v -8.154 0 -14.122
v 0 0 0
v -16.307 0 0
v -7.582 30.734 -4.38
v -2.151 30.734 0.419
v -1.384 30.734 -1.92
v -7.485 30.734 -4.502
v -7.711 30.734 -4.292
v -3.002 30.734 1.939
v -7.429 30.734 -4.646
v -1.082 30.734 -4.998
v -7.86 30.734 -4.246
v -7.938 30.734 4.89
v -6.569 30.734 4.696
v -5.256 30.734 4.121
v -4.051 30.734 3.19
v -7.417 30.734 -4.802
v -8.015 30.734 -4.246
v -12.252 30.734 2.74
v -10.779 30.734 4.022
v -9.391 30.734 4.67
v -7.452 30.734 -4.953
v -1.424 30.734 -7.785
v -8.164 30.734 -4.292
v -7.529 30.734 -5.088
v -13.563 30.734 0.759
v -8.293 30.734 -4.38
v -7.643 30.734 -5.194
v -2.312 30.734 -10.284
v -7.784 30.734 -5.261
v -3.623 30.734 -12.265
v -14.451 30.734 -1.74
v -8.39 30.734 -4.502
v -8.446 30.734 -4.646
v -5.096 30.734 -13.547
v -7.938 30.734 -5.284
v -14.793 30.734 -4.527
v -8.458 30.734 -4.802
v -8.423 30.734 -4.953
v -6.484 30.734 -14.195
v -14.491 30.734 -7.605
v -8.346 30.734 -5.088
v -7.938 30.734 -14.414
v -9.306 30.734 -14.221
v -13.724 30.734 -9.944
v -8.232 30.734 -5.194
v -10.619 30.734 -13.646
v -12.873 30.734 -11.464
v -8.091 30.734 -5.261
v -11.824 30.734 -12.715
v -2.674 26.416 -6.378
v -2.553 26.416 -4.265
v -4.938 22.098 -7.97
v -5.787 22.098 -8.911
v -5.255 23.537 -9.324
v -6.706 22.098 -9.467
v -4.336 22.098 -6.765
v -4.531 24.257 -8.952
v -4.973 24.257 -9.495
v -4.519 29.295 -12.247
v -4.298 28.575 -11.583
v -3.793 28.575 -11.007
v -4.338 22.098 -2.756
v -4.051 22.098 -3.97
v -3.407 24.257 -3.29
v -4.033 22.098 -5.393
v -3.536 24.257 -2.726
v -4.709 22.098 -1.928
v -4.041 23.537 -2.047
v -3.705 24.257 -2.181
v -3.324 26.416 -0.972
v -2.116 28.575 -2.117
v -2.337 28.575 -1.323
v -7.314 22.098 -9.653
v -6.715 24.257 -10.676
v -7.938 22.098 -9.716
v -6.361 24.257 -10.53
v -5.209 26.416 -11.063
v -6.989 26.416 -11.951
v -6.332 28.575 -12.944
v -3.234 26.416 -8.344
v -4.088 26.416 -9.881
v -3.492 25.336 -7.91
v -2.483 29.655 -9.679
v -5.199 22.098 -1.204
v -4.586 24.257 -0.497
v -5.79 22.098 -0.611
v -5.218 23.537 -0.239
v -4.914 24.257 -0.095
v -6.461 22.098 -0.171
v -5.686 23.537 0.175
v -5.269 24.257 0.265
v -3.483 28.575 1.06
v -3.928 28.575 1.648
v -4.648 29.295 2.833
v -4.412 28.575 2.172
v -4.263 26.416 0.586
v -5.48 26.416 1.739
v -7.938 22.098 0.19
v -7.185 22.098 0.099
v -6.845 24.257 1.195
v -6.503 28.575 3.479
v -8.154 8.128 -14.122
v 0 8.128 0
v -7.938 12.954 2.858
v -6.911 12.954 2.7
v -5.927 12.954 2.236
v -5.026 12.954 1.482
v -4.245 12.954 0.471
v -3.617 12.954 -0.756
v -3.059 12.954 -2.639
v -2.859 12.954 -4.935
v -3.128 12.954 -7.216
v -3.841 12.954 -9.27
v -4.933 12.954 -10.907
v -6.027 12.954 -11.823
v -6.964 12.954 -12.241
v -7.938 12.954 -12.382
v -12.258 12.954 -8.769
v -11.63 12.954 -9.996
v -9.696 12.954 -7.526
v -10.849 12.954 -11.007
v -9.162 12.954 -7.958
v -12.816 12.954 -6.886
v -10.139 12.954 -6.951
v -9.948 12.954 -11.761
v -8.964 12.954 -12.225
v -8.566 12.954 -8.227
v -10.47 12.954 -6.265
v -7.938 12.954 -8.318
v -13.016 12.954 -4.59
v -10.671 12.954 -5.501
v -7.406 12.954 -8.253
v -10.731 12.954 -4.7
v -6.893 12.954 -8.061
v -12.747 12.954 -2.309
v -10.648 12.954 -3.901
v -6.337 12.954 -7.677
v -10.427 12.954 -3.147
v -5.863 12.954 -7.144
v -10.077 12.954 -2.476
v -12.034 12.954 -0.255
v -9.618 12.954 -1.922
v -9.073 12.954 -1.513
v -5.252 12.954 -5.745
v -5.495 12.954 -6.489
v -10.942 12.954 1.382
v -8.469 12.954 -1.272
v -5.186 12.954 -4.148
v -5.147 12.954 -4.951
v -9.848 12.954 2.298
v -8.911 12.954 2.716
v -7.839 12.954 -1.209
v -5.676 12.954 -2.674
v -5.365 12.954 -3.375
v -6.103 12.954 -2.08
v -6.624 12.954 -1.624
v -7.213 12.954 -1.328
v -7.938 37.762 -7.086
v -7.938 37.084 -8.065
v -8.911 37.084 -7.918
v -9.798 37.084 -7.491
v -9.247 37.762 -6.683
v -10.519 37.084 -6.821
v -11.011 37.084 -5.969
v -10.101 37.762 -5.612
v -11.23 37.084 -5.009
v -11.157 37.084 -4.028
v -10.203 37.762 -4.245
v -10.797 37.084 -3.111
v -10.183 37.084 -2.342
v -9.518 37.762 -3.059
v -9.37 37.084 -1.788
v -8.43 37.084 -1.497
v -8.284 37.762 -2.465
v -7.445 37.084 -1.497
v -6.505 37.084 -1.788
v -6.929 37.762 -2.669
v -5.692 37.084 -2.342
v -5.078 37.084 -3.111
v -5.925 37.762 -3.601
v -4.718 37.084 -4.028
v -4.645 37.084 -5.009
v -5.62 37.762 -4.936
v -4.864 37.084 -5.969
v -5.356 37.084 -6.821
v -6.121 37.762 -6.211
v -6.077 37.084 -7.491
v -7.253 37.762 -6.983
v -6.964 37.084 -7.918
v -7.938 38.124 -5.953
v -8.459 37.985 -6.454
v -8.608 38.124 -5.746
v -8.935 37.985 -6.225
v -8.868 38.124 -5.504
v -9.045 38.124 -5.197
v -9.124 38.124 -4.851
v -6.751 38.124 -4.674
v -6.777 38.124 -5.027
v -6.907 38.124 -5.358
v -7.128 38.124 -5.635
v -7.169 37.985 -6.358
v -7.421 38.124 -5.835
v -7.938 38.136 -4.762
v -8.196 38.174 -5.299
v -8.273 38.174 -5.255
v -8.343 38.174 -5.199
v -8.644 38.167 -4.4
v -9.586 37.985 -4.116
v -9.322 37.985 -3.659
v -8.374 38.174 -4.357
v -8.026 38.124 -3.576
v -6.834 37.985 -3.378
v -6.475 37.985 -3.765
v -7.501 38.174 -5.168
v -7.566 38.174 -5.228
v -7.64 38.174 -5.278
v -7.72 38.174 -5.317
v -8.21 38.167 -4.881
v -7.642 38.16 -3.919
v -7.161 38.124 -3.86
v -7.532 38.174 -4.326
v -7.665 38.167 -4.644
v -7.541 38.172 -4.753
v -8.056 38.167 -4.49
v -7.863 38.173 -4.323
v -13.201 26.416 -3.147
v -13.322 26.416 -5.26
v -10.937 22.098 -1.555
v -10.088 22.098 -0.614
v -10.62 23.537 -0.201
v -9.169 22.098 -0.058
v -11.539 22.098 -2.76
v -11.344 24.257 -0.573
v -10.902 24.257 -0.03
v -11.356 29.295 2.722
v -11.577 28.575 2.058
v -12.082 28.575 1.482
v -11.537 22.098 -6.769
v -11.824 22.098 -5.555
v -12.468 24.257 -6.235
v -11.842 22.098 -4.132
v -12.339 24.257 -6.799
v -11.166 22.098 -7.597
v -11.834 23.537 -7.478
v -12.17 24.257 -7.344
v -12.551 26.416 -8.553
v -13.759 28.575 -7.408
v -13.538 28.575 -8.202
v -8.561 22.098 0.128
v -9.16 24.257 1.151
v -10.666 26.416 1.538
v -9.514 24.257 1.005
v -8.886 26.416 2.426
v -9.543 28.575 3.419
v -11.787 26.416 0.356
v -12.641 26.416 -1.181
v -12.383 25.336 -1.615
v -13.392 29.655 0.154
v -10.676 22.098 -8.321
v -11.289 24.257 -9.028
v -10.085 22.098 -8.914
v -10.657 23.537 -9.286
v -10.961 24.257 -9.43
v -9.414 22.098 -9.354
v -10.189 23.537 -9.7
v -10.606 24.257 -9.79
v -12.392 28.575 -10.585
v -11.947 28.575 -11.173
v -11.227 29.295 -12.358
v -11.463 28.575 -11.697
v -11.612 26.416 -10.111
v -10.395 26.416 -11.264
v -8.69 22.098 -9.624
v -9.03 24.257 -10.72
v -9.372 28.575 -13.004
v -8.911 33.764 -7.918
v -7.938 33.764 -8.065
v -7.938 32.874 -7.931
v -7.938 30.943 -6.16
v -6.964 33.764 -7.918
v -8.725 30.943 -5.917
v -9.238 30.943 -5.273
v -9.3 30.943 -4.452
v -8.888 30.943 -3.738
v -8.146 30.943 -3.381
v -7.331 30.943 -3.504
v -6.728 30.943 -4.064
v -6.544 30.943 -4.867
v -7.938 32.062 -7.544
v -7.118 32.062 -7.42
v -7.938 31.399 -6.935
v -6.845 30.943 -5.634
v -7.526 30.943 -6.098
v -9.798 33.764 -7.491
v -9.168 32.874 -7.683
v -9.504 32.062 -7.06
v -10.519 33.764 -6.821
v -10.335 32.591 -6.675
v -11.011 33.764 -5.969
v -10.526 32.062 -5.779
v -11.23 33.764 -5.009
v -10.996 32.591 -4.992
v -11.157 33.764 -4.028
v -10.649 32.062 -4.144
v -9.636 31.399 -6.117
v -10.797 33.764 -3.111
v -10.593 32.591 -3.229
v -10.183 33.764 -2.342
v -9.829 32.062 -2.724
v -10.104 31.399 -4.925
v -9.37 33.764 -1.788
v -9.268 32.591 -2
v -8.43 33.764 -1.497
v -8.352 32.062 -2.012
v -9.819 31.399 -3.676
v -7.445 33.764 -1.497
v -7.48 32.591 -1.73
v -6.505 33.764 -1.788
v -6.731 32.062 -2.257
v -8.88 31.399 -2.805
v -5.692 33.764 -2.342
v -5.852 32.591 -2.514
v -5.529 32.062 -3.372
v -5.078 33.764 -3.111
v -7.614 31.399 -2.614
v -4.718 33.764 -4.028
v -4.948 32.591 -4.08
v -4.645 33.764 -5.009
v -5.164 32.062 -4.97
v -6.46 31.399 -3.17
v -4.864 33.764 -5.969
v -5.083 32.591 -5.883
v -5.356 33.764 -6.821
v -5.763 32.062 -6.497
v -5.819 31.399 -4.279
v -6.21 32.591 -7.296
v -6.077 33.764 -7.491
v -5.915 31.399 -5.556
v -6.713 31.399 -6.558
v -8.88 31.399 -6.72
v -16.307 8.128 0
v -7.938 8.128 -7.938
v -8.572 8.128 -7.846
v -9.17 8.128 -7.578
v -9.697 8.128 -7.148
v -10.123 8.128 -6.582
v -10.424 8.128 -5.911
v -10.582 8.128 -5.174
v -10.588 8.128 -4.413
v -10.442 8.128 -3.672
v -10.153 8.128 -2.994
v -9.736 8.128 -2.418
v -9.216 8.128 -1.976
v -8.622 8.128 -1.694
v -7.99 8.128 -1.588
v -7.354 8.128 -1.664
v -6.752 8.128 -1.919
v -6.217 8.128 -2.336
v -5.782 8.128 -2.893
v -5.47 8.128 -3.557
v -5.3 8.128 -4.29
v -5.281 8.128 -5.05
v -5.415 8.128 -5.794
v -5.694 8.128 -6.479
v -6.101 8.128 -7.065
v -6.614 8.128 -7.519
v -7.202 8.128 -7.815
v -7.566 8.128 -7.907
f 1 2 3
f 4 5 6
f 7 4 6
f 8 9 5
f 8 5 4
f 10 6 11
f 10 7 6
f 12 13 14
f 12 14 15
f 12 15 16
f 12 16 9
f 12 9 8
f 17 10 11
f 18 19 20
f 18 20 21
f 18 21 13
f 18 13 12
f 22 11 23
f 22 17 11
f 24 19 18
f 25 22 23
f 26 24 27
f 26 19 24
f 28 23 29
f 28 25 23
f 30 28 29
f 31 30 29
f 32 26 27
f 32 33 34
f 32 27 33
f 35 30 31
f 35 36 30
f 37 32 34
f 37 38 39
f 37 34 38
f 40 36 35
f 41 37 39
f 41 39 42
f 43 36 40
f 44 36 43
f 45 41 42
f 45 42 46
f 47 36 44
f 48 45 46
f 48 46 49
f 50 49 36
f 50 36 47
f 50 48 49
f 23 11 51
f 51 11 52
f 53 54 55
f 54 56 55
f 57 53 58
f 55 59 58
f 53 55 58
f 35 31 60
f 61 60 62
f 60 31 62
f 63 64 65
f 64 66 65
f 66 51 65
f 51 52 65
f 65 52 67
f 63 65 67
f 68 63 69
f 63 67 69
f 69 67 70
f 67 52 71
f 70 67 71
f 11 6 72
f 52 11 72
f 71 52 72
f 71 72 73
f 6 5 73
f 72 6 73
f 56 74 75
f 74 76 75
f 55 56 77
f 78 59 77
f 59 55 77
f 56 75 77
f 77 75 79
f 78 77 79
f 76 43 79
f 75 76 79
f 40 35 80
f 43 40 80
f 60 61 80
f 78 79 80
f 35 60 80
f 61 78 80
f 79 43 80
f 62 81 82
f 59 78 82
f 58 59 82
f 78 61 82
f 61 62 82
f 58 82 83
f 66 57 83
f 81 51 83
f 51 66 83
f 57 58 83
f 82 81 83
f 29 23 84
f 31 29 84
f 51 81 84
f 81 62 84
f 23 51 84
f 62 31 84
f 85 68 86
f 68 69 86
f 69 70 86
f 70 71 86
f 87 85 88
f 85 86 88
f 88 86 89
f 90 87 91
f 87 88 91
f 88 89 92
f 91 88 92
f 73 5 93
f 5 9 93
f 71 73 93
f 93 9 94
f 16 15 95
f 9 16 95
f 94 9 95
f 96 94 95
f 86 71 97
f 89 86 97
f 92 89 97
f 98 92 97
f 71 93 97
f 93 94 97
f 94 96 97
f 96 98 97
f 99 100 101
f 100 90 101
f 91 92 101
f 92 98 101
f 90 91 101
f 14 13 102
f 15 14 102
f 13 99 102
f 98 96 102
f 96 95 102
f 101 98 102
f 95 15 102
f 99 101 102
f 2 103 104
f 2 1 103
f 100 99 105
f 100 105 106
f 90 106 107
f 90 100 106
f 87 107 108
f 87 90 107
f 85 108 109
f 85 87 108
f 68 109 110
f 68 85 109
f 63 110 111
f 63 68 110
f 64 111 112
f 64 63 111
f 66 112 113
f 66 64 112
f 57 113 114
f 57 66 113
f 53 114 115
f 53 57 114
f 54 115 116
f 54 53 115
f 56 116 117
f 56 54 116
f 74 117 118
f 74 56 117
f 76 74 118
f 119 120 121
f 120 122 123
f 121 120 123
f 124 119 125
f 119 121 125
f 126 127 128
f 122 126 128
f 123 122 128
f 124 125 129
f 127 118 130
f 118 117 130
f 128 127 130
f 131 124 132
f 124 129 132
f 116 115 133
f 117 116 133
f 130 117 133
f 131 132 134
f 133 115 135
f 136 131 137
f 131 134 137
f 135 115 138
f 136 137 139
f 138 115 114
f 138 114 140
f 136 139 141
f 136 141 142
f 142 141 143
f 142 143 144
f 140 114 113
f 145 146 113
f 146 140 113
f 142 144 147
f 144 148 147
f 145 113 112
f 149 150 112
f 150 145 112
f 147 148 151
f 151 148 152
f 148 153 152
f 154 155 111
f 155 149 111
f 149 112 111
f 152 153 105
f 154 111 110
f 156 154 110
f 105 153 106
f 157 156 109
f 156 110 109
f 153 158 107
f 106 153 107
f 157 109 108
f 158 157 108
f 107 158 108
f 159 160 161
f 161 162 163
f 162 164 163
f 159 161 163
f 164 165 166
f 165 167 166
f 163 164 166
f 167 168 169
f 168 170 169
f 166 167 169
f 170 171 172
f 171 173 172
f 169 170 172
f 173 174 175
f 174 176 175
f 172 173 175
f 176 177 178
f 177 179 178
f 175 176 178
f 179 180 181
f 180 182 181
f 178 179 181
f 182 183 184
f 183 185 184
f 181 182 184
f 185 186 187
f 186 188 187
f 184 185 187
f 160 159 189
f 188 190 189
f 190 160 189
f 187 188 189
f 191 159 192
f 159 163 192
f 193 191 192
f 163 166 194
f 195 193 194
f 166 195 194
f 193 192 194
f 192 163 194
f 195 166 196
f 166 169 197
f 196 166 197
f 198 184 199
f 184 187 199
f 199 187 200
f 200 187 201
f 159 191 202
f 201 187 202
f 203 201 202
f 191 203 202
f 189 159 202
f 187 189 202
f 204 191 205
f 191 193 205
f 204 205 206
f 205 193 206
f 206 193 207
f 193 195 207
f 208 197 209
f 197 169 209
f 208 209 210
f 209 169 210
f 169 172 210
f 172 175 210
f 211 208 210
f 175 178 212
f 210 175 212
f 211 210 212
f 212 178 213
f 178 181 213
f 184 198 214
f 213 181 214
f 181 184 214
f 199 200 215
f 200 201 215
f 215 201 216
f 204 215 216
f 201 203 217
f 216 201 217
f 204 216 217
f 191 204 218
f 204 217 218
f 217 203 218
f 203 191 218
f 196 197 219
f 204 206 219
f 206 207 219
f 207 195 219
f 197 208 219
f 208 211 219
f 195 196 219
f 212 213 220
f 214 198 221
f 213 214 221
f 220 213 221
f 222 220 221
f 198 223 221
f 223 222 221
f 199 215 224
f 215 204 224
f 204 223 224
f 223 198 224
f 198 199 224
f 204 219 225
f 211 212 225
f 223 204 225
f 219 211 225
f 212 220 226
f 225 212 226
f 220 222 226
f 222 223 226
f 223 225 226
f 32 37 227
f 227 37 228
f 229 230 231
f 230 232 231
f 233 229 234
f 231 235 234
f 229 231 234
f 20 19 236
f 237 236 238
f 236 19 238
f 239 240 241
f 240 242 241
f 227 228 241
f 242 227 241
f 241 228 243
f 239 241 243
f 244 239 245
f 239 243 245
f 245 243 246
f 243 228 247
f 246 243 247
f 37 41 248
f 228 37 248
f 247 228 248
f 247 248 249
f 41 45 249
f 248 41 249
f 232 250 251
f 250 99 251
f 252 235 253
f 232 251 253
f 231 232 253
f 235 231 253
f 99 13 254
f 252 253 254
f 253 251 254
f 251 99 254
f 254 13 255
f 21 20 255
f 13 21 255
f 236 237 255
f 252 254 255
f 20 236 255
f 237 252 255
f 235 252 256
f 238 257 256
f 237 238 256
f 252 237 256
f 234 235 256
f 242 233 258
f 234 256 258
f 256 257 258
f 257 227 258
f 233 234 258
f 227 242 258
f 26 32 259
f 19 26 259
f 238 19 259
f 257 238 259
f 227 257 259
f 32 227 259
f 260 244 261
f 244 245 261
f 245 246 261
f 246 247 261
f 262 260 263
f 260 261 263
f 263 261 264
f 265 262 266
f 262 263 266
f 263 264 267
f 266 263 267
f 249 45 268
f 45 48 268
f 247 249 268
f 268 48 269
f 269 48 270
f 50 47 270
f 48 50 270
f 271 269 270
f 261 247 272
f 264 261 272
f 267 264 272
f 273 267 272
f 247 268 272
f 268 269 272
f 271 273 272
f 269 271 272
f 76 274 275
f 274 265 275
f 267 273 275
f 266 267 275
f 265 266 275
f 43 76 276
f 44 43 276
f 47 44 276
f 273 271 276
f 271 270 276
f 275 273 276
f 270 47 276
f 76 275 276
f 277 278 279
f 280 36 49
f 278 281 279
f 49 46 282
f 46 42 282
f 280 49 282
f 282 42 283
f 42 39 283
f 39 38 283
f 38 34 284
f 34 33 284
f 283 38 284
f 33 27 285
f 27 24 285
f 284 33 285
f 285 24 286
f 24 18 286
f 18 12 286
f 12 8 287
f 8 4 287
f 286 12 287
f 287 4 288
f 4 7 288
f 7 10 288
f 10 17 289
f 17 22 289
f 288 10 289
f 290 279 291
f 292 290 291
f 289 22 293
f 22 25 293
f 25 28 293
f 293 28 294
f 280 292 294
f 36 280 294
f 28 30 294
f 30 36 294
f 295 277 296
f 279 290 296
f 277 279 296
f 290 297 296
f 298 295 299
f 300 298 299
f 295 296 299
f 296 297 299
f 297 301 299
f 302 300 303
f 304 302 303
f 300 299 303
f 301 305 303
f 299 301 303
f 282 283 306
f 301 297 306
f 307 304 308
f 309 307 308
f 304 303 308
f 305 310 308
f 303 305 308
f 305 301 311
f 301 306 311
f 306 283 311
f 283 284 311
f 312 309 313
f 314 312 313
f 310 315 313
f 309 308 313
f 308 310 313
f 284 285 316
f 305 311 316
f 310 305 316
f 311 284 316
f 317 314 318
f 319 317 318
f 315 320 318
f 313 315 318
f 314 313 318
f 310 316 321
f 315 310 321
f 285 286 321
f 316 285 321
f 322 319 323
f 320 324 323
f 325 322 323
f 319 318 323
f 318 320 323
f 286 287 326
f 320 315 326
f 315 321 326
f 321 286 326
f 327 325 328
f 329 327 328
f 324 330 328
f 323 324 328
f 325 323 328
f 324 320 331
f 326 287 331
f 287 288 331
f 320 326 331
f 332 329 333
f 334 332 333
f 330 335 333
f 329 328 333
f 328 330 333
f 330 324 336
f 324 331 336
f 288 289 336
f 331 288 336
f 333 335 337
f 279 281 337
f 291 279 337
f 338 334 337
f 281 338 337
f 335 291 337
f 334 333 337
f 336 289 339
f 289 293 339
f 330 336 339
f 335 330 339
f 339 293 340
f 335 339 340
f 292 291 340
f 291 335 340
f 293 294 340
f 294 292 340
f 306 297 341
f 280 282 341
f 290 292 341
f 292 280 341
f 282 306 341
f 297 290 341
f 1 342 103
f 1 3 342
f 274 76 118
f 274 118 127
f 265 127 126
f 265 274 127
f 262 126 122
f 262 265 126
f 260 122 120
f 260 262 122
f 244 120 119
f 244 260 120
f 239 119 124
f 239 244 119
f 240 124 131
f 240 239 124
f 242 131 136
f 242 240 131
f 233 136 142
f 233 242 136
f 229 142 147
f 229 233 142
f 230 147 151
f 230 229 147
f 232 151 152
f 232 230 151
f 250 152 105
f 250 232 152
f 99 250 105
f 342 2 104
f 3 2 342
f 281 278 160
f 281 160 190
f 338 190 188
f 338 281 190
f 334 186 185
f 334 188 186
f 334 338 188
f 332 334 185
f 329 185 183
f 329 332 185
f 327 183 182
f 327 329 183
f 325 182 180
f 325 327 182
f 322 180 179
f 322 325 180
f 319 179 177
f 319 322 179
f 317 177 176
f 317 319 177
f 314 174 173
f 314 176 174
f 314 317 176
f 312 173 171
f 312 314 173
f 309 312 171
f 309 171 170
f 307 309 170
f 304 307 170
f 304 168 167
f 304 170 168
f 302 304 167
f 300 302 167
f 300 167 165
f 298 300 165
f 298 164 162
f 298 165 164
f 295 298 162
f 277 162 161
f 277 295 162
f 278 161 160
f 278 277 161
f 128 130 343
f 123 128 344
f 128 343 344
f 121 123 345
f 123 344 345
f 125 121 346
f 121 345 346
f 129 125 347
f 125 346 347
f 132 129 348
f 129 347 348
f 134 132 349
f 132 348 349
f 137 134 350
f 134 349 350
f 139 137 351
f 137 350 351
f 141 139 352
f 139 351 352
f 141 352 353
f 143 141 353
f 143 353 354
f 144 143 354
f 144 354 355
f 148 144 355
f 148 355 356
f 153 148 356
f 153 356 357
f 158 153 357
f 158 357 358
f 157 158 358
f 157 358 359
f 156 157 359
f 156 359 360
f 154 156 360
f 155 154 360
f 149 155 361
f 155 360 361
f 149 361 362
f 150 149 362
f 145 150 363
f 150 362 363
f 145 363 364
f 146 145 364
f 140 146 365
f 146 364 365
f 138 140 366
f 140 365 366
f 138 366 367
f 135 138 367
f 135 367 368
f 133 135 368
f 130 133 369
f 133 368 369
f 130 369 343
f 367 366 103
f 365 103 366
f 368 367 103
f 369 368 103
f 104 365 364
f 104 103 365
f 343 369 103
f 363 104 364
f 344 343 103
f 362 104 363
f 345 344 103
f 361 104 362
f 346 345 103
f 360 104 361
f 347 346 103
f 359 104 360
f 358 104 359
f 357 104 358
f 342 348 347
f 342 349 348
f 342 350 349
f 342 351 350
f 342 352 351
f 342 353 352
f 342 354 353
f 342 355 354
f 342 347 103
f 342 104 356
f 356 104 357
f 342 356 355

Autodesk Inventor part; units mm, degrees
sketch "Sketch1" plane through (0, 0, 0) normal (0, 1, 0) x (-1, 0, 0)
  line L0 (0, 0) -> (16.3071, 0)
  line L1 (16.3071, 0) -> (8.1536, -14.1224)
  line L2 (8.1536, -14.1224) -> (0, 0)
  point P0 (8.1536, 0)
  dimension "d1" = 14.1224
  dimension "d3" = 0
extrude "Extrusion1" add sketch "Sketch1" along normal blind 8.128
sketch "Sketch2" plane through (0, 8.128, 0) normal (0, 1, 0) x (1, 0, 0)
  ellipse E0 centre (-7.9375, 4.7625) end of major axis (-5.2705, 4.7625) minor radius 3.175
  line L0 (-16.3071, 0) -> (0, 0) projected
  line L1 (0, 0) -> (-8.1536, 14.1224) projected
  line L2 (-8.1536, 14.1224) -> (-16.3071, 0) projected
  line L3 (-8.1536, 14.1224) -> (-16.3071, 0) projected
  dimension "d8" = 2.667
  dimension "d9" = 3.175
ref_plane "Work Plane1" through (0, 12.954, 0) normal (0, 1, 0) x (1, 0, 0)
sketch "Sketch3" plane through (0, 12.954, 0) normal (0, 1, 0) x (1, 0, 0)
  ellipse E0 centre (-7.9375, 4.7625) end of major axis (-7.9375, 8.3185) minor radius 2.794
  point P0 (0, 0)
  dimension "d11" = 2.794
  dimension "d12" = 3.556
  dimension "d13" = 0
  dimension "d14" = 0
loft "Loft1" add profiles "Sketch3", "Sketch2" contours all / E0
ref_plane "Work Plane2" through (-7.9375, 22.098, -4.7625) normal (0, 1, 0) x (1, 0, 0)
sketch "Sketch4" plane through (-7.9375, 22.098, -4.7625) normal (0, 1, 0) x (1, 0, 0)
  ellipse E0 centre (0, 0) end of major axis (0, 4.953) minor radius 3.937
  point P0 (7.9375, -4.7625)
  dimension "d20" = 3.937
  dimension "d21" = 4.953
sketch "Sketch5" plane through (-7.9375, 12.954, -4.7625) normal (0, 1, 0) x (1, 0, 0)
  ellipse E0 centre (0, 0) end of major axis (0, -7.62) minor radius 5.08
  point P0 (7.9375, -4.7625)
  dimension "d22" = 5.08
  dimension "d23" = 7.62
loft "Loft2" add profiles "Sketch5", "Sketch4"
ref_plane "Work Plane3" through (-7.9375, 30.734, -4.7625) normal (0, 1, 0) x (1, 0, 0)
sketch "Sketch7" plane through (-7.9375, 30.734, -4.7625) normal (0, 1, 0) x (1, 0, 0)
  ellipse E0 centre (0, 0) end of major axis (0, 9.652) minor radius 6.858
  point P0 (7.9375, -4.7625)
  dimension "d29" = 6.858
  dimension "d30" = 9.652
loft "Loft3" add profiles "Sketch7" section 1 edges at (-4.0005, 22.098, -4.7625) (-11.8745, 22.098, -4.7625)
sketch "Sketch8" plane through (-7.9375, 30.734, -4.7625) normal (0, 1, 0) x (1, 0, 0)
  ellipse E0 centre (0, 0) end of major axis (0, -9.652) minor radius 6.858 projected
  line L0 (0, 9.652) -> (0, -9.652)
  point P0 (7.9375, -4.7625)
ref_plane "Work Plane4" through (-7.9375, 30.734, -14.4145) normal (-1, 0, 0) x (0, 0, 1)
sketch "Sketch9" plane through (-7.9375, 30.734, -14.4145) normal (-1, 0, 0) x (0, 0, 1)
  line L0 (0, 0) -> (19.304, 0) projected
  line L1 (9.652, 0) -> (9.652, 7.4025)
  line L2 (6.35, 6.35) -> (6.35, 3.0298)
  arc A0 (9.652, 7.4025) -> (6.35, 6.35) centre (9.1003, 3.4274) ccw
  arc A1 (6.35, 3.0298) -> (9.652, 0) centre (9.391, 3.0298) ccw
  point P0 (14.4145, -30.734)
revolve "Revolution1" add sketch "Sketch9" angle 360 about axis through (-7.9375, 30.734, -4.7625) along (0, 1, 0)
properties part number "femsle" material "PMMA Plastic"
